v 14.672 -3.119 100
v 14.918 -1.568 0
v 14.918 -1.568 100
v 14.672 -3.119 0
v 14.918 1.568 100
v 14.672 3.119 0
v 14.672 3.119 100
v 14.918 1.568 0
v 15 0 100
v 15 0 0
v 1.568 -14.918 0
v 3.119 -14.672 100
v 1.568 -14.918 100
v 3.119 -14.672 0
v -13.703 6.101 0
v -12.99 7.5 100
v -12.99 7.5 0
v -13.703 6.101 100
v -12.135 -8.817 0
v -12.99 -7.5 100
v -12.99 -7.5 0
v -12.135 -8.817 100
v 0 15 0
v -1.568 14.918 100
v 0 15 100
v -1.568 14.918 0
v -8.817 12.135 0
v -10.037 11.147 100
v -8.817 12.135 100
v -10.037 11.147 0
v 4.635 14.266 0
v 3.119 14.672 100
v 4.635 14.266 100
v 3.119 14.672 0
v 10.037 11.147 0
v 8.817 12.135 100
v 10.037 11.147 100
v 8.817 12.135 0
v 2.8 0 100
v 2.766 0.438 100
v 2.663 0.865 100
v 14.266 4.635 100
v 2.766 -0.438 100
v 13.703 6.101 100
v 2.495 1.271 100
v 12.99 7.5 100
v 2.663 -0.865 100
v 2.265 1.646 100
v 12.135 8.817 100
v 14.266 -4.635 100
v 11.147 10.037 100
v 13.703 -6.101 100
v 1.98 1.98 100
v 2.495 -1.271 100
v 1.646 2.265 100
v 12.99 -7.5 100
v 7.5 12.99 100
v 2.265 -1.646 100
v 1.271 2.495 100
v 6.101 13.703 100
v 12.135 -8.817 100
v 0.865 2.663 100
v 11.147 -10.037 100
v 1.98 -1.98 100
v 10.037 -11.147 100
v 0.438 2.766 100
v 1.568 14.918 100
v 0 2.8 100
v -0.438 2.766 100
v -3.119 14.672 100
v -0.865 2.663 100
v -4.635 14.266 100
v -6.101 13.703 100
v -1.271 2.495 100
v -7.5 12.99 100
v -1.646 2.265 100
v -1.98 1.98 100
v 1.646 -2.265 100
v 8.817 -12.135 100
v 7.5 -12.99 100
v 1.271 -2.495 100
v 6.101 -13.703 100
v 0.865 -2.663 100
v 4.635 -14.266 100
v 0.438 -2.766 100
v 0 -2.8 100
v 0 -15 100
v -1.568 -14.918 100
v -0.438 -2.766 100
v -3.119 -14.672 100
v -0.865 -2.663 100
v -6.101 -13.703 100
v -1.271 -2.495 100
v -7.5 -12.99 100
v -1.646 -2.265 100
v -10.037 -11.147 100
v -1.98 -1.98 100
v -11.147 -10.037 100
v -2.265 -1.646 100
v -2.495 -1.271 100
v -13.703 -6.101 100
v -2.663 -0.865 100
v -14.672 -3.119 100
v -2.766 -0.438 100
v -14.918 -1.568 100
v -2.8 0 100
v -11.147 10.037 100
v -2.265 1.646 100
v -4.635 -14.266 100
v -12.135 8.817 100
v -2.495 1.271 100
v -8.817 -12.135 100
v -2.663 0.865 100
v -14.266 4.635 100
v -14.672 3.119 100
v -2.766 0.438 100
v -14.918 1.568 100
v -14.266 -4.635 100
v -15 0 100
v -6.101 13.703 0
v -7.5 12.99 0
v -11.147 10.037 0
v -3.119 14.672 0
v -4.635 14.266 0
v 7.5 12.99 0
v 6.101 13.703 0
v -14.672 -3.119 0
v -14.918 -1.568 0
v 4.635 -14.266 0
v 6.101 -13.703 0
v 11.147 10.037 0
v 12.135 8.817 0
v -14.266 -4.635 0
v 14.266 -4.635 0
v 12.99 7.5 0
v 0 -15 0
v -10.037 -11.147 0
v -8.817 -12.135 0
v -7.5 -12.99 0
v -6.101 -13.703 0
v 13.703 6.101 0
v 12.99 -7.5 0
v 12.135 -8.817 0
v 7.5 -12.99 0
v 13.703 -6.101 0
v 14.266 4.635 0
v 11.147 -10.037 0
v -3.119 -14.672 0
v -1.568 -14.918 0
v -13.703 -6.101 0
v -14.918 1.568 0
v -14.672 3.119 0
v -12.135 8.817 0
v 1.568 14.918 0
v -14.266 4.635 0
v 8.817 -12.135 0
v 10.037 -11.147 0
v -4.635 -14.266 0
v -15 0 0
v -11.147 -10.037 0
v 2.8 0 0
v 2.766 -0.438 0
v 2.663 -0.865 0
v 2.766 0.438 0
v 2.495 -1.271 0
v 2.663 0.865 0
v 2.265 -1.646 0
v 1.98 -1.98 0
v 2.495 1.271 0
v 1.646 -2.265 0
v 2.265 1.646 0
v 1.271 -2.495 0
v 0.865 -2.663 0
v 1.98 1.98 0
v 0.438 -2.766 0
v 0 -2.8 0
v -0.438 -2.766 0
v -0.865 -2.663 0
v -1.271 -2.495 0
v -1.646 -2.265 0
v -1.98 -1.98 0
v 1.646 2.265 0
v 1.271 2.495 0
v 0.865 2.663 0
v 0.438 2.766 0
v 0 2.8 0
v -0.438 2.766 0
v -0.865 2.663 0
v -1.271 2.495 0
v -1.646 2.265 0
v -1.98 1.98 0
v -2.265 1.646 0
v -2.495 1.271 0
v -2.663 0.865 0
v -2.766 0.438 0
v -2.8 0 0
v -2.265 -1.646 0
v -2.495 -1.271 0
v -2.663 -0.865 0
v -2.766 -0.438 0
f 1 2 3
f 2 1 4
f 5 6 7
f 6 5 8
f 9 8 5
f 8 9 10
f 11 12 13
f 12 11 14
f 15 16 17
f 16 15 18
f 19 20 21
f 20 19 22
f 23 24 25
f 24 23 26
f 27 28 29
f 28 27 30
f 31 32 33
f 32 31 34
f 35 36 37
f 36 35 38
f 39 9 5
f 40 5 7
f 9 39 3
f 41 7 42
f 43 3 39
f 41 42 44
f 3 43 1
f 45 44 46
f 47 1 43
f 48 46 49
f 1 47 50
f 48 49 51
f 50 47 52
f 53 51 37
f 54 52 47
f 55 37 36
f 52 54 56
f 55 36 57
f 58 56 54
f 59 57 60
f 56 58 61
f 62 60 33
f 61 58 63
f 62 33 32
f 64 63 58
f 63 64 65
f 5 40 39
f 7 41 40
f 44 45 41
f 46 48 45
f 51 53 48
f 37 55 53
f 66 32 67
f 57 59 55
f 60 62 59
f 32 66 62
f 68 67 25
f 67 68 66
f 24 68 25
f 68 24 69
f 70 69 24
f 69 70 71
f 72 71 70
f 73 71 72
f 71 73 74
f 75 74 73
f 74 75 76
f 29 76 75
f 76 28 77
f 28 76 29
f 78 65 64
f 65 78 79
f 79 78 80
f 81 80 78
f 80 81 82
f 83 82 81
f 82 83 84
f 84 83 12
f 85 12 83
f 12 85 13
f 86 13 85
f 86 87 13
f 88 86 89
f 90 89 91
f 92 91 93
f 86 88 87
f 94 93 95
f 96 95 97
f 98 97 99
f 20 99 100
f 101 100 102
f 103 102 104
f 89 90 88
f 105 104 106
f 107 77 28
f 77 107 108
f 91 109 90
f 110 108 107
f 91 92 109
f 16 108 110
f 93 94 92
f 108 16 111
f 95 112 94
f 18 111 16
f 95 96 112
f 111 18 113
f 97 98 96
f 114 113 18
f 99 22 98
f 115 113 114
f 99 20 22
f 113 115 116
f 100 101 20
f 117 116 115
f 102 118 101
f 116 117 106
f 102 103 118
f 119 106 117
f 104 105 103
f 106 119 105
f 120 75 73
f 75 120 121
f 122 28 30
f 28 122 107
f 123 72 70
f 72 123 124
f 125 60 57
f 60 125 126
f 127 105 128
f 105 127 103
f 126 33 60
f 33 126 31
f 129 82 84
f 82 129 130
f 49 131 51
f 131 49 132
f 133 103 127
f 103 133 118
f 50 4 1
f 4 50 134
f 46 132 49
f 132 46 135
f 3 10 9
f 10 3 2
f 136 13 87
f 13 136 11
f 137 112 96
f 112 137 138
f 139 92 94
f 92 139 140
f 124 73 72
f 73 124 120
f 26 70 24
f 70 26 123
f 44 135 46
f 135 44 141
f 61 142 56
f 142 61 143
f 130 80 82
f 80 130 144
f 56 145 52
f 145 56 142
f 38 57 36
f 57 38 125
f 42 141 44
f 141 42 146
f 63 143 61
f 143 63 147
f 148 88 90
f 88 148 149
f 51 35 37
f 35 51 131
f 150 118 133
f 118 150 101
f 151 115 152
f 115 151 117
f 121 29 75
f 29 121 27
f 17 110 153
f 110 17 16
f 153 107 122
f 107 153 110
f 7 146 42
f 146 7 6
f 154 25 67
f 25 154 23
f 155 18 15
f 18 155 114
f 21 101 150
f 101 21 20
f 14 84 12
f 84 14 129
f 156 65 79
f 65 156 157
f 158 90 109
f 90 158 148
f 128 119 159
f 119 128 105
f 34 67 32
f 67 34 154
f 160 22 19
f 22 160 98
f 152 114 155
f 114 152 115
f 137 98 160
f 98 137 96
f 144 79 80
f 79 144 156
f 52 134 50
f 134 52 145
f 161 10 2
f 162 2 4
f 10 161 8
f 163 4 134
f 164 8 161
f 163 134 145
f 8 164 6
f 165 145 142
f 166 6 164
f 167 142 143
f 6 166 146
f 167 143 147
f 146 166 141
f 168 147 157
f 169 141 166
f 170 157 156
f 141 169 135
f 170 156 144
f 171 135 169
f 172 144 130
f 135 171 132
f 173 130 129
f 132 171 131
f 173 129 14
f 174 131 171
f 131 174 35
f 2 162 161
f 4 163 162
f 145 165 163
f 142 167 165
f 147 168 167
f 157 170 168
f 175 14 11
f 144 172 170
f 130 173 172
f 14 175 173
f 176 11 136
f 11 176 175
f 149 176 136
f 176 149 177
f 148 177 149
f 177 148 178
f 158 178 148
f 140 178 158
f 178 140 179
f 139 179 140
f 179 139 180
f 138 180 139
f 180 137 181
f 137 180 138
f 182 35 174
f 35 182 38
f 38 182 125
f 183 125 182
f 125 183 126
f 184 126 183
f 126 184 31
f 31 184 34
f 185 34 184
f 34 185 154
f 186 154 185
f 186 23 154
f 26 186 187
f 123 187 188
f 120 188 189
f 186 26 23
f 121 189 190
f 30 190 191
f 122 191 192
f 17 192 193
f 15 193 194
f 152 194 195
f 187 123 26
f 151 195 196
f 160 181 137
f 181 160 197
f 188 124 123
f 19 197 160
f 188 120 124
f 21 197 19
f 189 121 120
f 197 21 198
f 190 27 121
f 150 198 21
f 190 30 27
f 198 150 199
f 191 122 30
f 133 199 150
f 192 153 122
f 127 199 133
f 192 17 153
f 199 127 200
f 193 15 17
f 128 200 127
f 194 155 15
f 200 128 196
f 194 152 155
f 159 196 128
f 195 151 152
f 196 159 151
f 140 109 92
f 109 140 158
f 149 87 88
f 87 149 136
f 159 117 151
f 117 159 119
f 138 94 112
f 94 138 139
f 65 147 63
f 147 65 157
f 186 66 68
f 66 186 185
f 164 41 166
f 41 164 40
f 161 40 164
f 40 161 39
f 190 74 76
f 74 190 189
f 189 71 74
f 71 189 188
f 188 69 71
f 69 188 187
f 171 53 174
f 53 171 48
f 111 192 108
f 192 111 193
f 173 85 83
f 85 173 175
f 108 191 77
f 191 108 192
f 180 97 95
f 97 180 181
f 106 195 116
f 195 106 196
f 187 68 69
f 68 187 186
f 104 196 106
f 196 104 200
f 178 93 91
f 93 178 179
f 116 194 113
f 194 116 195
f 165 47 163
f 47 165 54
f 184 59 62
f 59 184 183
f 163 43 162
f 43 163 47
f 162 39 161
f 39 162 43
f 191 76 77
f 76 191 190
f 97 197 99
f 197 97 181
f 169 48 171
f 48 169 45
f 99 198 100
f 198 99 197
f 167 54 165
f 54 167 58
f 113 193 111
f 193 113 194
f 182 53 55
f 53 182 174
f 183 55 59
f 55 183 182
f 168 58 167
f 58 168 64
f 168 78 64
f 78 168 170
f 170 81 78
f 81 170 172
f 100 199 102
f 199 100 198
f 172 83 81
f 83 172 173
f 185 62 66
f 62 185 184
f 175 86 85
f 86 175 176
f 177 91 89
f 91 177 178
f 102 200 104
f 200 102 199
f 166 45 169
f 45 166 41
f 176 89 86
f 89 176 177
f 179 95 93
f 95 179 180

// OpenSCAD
        // Generation: 1 | Session: test-env-id
        wall_thickness = 2.0;
        bore_clearance = 0.8;
        roller_radius = 15.0;
        
        module roller() {
            difference() {
                cylinder(h=100, r=roller_radius, $fn=60);
                translate([0,0,-5])
                    cylinder(h=110, r=bore_clearance + 2, $fn=40);
            }
        }
        roller();
        
